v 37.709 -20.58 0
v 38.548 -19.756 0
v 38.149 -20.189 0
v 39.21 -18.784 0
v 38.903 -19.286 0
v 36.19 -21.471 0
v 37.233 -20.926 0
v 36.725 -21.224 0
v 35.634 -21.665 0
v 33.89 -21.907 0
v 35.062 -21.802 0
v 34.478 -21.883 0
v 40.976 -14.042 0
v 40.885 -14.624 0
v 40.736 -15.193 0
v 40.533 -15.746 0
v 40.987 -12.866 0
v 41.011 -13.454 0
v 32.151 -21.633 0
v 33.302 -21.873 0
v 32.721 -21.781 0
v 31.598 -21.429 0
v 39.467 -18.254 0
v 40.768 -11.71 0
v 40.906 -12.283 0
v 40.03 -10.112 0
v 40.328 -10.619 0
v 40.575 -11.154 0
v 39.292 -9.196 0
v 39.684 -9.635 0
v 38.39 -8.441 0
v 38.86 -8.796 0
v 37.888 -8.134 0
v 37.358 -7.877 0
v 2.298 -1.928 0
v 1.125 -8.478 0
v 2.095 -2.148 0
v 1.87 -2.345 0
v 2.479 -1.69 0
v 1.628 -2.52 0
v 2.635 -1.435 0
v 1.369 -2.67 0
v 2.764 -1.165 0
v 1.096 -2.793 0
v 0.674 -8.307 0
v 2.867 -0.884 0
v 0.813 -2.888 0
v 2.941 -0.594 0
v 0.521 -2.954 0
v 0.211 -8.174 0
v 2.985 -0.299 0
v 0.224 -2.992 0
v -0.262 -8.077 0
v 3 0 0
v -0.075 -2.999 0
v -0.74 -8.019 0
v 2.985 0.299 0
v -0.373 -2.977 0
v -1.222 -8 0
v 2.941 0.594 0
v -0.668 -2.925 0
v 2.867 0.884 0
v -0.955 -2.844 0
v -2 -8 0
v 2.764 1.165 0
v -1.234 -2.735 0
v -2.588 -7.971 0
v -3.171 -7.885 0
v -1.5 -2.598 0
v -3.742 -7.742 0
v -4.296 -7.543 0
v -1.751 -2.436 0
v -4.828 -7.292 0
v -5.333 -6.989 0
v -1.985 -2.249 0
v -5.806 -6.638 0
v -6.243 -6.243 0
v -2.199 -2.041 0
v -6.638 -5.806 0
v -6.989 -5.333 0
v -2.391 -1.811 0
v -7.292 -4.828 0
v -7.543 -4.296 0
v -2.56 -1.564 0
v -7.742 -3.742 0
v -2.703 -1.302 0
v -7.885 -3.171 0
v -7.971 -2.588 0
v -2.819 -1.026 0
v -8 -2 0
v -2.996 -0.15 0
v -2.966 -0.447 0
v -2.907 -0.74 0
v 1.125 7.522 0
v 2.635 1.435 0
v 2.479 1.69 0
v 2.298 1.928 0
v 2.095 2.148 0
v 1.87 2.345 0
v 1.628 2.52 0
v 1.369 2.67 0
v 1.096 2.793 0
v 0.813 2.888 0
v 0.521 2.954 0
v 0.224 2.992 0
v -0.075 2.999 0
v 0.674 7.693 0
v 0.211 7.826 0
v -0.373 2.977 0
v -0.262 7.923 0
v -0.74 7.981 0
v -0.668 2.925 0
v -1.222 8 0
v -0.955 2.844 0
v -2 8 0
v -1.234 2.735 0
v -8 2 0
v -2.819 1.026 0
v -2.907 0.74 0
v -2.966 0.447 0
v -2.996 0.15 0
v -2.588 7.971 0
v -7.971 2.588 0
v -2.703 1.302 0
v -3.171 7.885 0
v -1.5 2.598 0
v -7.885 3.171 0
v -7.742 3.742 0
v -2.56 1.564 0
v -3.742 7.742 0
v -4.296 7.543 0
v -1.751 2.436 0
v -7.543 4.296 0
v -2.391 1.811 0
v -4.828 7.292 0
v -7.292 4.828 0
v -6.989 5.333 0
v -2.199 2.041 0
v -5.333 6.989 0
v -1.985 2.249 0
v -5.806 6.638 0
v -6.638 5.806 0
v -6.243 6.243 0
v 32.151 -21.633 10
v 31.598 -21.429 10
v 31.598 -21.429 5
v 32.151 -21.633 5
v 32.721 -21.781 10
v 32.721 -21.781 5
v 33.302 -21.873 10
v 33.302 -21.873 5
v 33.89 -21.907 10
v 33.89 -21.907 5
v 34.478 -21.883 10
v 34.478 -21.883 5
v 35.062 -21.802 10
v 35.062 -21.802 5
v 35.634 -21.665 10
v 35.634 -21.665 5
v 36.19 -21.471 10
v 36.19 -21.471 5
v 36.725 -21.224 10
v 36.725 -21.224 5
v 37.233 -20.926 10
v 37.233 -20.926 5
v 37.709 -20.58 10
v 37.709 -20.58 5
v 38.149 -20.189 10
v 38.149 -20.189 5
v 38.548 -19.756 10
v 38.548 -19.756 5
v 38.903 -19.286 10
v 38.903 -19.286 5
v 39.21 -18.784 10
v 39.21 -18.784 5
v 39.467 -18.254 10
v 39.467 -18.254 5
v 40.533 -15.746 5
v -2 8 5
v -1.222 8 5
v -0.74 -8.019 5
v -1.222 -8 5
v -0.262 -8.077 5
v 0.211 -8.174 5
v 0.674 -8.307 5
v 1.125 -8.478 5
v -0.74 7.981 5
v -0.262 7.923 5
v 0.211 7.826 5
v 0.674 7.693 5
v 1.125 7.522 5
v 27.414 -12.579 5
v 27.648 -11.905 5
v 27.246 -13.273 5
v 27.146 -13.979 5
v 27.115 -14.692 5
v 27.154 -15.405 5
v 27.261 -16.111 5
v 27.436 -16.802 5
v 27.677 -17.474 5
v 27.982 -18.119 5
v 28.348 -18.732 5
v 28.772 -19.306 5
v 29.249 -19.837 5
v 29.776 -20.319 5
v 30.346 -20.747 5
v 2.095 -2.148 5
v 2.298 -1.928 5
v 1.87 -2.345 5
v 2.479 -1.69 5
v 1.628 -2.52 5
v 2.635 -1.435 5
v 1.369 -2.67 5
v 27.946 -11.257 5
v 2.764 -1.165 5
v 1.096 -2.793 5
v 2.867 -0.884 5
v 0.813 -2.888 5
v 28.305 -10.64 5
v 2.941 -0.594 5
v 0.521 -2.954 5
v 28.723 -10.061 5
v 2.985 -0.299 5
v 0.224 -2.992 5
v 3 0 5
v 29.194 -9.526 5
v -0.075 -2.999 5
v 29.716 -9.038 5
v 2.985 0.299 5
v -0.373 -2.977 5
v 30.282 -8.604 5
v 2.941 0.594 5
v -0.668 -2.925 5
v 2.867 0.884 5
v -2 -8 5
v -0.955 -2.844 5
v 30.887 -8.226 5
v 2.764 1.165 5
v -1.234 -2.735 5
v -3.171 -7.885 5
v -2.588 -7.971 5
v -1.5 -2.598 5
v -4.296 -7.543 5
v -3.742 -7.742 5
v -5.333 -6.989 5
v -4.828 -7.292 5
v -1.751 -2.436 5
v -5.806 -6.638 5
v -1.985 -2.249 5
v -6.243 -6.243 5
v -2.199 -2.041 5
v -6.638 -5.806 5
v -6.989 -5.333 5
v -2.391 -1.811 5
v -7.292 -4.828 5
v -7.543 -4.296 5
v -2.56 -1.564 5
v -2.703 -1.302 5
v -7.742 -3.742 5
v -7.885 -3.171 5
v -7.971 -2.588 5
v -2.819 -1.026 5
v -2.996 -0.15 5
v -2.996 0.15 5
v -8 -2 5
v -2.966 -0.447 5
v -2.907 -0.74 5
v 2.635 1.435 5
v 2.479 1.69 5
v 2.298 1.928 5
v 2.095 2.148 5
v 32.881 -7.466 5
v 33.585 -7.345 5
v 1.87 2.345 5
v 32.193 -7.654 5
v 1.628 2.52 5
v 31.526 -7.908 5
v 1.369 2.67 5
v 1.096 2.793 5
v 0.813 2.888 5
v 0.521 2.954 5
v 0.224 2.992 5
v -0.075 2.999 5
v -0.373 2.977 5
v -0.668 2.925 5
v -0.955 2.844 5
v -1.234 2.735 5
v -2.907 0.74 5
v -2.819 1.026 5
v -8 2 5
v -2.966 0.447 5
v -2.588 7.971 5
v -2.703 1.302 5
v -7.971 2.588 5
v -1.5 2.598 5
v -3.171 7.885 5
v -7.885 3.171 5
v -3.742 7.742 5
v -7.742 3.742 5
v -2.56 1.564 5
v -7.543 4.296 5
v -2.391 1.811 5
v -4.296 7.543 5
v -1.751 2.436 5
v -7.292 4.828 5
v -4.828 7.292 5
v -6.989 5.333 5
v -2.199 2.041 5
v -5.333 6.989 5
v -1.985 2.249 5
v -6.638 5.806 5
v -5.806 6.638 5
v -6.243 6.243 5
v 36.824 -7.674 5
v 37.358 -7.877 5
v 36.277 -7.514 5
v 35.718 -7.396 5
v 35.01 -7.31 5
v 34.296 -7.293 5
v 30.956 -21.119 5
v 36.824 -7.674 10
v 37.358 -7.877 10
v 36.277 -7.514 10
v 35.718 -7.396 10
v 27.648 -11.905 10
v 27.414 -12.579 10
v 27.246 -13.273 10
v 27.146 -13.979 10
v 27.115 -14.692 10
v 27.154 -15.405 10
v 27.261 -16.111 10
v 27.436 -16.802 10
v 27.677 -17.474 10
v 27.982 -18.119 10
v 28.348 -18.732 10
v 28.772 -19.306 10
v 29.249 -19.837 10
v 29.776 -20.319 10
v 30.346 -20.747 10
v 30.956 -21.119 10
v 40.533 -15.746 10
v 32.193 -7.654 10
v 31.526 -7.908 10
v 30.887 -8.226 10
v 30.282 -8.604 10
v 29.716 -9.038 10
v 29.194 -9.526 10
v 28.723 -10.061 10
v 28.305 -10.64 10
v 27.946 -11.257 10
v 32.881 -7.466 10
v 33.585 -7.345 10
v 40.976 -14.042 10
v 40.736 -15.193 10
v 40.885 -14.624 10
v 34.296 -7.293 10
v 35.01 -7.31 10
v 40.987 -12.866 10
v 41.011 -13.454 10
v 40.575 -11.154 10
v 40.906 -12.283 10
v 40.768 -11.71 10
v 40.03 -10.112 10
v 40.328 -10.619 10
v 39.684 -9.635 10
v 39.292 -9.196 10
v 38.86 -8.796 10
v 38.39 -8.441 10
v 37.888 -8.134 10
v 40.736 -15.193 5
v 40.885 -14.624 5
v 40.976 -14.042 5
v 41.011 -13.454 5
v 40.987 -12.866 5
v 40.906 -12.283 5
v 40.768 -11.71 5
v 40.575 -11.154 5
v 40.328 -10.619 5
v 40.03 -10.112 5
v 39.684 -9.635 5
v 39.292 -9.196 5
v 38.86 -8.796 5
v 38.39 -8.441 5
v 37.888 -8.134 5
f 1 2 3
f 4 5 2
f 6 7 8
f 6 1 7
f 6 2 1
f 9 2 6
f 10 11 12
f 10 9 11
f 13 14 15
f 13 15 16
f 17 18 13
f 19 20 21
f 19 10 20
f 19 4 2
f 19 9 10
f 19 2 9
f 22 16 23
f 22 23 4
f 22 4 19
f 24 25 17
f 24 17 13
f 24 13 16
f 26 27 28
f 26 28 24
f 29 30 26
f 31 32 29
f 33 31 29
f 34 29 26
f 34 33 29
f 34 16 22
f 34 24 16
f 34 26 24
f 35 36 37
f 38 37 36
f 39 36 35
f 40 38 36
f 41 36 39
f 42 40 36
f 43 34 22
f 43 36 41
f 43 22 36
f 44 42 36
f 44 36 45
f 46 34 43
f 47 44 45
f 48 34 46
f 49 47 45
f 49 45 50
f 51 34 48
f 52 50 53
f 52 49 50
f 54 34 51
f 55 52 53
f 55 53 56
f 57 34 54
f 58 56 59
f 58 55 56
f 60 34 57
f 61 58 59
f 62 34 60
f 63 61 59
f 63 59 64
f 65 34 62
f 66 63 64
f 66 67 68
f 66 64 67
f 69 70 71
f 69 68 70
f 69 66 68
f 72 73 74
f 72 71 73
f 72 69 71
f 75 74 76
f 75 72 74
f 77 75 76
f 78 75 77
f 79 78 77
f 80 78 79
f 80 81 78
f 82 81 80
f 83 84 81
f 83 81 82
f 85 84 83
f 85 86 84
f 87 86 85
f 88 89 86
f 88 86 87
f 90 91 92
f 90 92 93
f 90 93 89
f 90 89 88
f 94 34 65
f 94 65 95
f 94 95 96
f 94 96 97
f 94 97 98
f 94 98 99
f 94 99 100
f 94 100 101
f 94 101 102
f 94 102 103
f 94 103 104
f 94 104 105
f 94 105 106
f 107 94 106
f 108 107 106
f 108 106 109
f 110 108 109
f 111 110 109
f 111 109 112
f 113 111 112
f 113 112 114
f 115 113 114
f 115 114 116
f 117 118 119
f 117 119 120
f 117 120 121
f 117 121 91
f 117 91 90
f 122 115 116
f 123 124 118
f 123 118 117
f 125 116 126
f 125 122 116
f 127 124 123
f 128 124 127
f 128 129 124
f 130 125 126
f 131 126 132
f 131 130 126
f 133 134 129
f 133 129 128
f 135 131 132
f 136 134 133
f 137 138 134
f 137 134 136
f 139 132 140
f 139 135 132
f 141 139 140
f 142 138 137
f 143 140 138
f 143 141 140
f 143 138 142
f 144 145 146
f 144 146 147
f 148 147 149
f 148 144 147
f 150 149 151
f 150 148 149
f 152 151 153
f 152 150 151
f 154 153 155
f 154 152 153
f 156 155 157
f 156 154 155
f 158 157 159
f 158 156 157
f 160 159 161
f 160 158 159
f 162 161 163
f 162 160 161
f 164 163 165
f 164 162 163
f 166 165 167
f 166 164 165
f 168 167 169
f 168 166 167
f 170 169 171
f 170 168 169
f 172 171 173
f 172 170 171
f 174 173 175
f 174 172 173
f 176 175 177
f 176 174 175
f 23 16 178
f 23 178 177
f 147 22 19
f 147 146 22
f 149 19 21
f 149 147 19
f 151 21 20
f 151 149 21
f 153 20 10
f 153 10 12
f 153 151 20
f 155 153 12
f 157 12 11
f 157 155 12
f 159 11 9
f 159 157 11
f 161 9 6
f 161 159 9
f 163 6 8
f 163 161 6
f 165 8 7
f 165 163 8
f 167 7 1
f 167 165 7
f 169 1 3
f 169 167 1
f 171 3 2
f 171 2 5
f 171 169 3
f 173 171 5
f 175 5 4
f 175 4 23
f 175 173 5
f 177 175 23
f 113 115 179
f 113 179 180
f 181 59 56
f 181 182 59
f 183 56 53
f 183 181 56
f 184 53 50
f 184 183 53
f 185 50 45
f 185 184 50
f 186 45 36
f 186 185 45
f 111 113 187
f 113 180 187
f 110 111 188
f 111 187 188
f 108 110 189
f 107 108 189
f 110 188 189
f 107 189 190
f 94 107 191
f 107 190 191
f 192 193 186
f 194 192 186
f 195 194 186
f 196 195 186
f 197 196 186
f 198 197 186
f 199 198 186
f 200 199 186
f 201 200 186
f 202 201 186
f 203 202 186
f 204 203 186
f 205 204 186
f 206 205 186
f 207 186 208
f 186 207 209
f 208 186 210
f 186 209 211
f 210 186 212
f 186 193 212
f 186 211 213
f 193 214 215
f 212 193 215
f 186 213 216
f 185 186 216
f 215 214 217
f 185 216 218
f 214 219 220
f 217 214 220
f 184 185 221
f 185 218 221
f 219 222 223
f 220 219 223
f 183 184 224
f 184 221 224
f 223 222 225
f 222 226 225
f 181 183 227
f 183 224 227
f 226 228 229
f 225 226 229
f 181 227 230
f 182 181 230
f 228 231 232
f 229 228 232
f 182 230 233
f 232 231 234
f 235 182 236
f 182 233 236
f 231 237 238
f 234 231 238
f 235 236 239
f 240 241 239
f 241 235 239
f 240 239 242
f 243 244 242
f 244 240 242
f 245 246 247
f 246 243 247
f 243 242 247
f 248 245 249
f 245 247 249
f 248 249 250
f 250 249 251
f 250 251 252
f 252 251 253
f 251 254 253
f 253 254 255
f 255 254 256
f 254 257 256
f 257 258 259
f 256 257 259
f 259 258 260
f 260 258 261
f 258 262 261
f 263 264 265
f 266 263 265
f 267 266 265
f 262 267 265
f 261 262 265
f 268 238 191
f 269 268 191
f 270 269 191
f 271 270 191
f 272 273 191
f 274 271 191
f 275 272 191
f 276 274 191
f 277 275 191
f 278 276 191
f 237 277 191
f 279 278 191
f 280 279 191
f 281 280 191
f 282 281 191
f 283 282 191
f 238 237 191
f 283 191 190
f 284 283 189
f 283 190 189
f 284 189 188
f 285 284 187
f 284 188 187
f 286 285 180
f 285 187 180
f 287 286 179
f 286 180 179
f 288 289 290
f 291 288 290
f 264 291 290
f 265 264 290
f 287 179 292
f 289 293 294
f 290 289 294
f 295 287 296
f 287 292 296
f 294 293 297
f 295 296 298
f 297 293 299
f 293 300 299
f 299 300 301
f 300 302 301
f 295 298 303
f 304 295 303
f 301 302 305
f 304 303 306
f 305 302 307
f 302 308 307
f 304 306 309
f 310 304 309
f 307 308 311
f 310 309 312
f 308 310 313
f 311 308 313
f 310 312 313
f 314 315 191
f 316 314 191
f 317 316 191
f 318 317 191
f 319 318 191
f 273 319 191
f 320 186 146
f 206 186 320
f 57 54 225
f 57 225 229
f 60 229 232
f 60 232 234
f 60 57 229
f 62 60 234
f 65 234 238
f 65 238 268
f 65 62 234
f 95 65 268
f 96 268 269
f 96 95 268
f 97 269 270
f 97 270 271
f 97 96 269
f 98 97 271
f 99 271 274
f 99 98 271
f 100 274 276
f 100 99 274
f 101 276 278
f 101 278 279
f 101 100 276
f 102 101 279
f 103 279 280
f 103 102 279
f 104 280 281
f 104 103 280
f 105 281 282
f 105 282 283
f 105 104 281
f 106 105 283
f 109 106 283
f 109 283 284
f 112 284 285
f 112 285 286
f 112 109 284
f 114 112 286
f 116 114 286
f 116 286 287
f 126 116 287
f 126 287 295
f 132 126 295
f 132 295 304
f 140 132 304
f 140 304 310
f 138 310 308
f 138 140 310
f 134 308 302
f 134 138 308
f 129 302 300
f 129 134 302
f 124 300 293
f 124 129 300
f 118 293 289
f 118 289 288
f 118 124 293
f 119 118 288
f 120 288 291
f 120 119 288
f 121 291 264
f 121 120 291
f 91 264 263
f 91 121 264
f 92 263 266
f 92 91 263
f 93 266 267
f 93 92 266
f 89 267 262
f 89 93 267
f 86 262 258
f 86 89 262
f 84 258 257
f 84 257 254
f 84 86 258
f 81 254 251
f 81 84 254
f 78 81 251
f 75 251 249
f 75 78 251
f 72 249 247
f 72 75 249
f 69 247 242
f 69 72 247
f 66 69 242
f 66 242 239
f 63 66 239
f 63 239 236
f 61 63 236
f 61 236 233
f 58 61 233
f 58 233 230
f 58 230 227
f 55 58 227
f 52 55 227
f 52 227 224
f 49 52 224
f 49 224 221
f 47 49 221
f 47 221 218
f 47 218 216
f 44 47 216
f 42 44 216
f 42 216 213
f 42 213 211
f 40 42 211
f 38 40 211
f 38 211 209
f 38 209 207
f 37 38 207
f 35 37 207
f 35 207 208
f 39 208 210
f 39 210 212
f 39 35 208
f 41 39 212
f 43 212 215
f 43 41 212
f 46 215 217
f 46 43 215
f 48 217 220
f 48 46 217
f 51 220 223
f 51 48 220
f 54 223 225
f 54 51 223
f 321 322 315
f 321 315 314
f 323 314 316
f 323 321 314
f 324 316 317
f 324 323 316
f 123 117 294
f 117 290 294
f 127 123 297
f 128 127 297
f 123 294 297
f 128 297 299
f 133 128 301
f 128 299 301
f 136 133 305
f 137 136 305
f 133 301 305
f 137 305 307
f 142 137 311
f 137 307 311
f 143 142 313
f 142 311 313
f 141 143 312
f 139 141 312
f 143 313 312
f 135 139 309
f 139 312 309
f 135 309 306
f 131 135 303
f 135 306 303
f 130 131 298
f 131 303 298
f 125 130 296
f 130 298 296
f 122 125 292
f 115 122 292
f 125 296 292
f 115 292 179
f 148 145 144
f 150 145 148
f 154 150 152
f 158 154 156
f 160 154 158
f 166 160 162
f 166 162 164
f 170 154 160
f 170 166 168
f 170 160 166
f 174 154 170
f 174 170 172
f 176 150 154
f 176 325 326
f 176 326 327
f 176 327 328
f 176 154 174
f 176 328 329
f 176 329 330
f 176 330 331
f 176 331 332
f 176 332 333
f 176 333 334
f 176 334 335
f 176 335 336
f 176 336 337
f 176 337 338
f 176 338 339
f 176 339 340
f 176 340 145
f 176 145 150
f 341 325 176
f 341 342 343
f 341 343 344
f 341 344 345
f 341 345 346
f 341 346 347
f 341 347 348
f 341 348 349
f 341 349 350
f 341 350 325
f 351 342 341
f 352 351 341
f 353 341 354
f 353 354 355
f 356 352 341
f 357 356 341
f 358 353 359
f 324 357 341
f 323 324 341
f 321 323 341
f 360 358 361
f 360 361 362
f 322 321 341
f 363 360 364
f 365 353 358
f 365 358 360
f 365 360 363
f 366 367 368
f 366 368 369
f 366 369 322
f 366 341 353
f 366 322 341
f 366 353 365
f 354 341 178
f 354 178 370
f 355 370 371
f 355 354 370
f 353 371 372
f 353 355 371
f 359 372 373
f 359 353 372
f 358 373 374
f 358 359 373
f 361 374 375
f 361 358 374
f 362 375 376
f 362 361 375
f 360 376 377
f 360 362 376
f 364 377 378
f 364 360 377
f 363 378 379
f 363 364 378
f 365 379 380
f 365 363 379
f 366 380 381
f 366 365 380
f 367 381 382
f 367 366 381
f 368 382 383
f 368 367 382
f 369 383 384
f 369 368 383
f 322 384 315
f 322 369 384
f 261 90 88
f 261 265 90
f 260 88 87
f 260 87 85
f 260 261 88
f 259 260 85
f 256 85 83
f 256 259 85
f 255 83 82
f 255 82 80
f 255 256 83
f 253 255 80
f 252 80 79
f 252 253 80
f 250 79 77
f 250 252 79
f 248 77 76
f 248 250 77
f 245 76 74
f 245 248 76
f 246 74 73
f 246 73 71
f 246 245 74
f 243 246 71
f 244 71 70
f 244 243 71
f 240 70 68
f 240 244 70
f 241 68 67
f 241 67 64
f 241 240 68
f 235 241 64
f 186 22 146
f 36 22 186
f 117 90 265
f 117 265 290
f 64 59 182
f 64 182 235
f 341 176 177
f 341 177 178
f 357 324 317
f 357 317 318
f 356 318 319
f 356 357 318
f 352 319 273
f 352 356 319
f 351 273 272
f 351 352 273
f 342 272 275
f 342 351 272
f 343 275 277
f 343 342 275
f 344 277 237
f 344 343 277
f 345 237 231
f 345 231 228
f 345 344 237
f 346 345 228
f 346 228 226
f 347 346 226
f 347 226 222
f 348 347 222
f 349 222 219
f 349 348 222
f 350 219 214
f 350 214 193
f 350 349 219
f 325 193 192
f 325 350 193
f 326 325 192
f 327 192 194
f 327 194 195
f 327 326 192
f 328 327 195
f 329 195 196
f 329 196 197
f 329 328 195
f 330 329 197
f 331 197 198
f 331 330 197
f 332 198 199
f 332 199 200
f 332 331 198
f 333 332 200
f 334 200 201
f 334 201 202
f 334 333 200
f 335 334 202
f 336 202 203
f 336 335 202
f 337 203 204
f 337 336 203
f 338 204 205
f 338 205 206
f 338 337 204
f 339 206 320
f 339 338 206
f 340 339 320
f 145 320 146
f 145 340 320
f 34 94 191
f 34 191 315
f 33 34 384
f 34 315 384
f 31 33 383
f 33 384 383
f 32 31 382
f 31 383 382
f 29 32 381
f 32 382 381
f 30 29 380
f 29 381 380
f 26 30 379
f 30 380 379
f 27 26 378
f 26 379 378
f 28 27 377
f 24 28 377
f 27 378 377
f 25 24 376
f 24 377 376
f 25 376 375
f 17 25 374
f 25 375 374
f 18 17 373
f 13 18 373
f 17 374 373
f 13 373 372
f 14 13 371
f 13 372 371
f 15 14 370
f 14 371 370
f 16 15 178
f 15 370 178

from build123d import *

# Parameters (mm, degrees)
ESBO_O1_R                = 3
RESSALTO_EXTRUS_O1_DEPTH = 5
FILETE1_R                = 6
RESSALTO_EXTRUS_O2_START = 5
RESSALTO_EXTRUS_O2_DEPTH = 5


with BuildPart() as part:
    # Esboço1 → Ressalto-extrusão1 (new body)
    with BuildSketch(Plane.XY):
        Polygon((-8, -8), (-8, 8), (0, 8), (42.879830598, -10.223928004), (37.120169402, -23.776071996), (0, -8), align=None)
        Circle(ESBO_O1_R, mode=Mode.SUBTRACT)
    extrude(amount=RESSALTO_EXTRUS_O1_DEPTH)

    # Filete1
    filete1_edges = [part.edges().sort_by_distance(p)[0] for p in [
        (-8, -8, 2.5),
        (0, -8, 2.5),
        (37.120169402, -23.776071996, 2.5),
        (42.879830598, -10.223928004, 2.5),
        (0, 8, 2.5),
        (-8, 8, 2.5),
    ]]
    fillet(filete1_edges, radius=FILETE1_R)

    # Esboço2 → Ressalto-extrusão2 (add)
    with BuildSketch(Plane.XY.offset(5).offset(RESSALTO_EXTRUS_O2_START)):
        with BuildLine():
            Line((39.467013244, -18.254086485), (40.532986756, -15.745913515))
            ThreePointArc((40.532986756, -15.745913515), (40.575103841, -11.153905468), (37.357845087, -7.877084162))
            ThreePointArc((37.357845087, -7.877084162), (36.552086472, -7.588681558), (35.718304651, -7.395728495))
            ThreePointArc((35.718304651, -7.395728495), (27.413539889, -12.579084175), (31.598183891, -21.429228154))
            ThreePointArc((31.598183891, -21.429228154), (36.190191938, -21.471345238), (39.467013244, -18.254086485))
        make_face()
    extrude(amount=-RESSALTO_EXTRUS_O2_DEPTH)


solid = part.part
